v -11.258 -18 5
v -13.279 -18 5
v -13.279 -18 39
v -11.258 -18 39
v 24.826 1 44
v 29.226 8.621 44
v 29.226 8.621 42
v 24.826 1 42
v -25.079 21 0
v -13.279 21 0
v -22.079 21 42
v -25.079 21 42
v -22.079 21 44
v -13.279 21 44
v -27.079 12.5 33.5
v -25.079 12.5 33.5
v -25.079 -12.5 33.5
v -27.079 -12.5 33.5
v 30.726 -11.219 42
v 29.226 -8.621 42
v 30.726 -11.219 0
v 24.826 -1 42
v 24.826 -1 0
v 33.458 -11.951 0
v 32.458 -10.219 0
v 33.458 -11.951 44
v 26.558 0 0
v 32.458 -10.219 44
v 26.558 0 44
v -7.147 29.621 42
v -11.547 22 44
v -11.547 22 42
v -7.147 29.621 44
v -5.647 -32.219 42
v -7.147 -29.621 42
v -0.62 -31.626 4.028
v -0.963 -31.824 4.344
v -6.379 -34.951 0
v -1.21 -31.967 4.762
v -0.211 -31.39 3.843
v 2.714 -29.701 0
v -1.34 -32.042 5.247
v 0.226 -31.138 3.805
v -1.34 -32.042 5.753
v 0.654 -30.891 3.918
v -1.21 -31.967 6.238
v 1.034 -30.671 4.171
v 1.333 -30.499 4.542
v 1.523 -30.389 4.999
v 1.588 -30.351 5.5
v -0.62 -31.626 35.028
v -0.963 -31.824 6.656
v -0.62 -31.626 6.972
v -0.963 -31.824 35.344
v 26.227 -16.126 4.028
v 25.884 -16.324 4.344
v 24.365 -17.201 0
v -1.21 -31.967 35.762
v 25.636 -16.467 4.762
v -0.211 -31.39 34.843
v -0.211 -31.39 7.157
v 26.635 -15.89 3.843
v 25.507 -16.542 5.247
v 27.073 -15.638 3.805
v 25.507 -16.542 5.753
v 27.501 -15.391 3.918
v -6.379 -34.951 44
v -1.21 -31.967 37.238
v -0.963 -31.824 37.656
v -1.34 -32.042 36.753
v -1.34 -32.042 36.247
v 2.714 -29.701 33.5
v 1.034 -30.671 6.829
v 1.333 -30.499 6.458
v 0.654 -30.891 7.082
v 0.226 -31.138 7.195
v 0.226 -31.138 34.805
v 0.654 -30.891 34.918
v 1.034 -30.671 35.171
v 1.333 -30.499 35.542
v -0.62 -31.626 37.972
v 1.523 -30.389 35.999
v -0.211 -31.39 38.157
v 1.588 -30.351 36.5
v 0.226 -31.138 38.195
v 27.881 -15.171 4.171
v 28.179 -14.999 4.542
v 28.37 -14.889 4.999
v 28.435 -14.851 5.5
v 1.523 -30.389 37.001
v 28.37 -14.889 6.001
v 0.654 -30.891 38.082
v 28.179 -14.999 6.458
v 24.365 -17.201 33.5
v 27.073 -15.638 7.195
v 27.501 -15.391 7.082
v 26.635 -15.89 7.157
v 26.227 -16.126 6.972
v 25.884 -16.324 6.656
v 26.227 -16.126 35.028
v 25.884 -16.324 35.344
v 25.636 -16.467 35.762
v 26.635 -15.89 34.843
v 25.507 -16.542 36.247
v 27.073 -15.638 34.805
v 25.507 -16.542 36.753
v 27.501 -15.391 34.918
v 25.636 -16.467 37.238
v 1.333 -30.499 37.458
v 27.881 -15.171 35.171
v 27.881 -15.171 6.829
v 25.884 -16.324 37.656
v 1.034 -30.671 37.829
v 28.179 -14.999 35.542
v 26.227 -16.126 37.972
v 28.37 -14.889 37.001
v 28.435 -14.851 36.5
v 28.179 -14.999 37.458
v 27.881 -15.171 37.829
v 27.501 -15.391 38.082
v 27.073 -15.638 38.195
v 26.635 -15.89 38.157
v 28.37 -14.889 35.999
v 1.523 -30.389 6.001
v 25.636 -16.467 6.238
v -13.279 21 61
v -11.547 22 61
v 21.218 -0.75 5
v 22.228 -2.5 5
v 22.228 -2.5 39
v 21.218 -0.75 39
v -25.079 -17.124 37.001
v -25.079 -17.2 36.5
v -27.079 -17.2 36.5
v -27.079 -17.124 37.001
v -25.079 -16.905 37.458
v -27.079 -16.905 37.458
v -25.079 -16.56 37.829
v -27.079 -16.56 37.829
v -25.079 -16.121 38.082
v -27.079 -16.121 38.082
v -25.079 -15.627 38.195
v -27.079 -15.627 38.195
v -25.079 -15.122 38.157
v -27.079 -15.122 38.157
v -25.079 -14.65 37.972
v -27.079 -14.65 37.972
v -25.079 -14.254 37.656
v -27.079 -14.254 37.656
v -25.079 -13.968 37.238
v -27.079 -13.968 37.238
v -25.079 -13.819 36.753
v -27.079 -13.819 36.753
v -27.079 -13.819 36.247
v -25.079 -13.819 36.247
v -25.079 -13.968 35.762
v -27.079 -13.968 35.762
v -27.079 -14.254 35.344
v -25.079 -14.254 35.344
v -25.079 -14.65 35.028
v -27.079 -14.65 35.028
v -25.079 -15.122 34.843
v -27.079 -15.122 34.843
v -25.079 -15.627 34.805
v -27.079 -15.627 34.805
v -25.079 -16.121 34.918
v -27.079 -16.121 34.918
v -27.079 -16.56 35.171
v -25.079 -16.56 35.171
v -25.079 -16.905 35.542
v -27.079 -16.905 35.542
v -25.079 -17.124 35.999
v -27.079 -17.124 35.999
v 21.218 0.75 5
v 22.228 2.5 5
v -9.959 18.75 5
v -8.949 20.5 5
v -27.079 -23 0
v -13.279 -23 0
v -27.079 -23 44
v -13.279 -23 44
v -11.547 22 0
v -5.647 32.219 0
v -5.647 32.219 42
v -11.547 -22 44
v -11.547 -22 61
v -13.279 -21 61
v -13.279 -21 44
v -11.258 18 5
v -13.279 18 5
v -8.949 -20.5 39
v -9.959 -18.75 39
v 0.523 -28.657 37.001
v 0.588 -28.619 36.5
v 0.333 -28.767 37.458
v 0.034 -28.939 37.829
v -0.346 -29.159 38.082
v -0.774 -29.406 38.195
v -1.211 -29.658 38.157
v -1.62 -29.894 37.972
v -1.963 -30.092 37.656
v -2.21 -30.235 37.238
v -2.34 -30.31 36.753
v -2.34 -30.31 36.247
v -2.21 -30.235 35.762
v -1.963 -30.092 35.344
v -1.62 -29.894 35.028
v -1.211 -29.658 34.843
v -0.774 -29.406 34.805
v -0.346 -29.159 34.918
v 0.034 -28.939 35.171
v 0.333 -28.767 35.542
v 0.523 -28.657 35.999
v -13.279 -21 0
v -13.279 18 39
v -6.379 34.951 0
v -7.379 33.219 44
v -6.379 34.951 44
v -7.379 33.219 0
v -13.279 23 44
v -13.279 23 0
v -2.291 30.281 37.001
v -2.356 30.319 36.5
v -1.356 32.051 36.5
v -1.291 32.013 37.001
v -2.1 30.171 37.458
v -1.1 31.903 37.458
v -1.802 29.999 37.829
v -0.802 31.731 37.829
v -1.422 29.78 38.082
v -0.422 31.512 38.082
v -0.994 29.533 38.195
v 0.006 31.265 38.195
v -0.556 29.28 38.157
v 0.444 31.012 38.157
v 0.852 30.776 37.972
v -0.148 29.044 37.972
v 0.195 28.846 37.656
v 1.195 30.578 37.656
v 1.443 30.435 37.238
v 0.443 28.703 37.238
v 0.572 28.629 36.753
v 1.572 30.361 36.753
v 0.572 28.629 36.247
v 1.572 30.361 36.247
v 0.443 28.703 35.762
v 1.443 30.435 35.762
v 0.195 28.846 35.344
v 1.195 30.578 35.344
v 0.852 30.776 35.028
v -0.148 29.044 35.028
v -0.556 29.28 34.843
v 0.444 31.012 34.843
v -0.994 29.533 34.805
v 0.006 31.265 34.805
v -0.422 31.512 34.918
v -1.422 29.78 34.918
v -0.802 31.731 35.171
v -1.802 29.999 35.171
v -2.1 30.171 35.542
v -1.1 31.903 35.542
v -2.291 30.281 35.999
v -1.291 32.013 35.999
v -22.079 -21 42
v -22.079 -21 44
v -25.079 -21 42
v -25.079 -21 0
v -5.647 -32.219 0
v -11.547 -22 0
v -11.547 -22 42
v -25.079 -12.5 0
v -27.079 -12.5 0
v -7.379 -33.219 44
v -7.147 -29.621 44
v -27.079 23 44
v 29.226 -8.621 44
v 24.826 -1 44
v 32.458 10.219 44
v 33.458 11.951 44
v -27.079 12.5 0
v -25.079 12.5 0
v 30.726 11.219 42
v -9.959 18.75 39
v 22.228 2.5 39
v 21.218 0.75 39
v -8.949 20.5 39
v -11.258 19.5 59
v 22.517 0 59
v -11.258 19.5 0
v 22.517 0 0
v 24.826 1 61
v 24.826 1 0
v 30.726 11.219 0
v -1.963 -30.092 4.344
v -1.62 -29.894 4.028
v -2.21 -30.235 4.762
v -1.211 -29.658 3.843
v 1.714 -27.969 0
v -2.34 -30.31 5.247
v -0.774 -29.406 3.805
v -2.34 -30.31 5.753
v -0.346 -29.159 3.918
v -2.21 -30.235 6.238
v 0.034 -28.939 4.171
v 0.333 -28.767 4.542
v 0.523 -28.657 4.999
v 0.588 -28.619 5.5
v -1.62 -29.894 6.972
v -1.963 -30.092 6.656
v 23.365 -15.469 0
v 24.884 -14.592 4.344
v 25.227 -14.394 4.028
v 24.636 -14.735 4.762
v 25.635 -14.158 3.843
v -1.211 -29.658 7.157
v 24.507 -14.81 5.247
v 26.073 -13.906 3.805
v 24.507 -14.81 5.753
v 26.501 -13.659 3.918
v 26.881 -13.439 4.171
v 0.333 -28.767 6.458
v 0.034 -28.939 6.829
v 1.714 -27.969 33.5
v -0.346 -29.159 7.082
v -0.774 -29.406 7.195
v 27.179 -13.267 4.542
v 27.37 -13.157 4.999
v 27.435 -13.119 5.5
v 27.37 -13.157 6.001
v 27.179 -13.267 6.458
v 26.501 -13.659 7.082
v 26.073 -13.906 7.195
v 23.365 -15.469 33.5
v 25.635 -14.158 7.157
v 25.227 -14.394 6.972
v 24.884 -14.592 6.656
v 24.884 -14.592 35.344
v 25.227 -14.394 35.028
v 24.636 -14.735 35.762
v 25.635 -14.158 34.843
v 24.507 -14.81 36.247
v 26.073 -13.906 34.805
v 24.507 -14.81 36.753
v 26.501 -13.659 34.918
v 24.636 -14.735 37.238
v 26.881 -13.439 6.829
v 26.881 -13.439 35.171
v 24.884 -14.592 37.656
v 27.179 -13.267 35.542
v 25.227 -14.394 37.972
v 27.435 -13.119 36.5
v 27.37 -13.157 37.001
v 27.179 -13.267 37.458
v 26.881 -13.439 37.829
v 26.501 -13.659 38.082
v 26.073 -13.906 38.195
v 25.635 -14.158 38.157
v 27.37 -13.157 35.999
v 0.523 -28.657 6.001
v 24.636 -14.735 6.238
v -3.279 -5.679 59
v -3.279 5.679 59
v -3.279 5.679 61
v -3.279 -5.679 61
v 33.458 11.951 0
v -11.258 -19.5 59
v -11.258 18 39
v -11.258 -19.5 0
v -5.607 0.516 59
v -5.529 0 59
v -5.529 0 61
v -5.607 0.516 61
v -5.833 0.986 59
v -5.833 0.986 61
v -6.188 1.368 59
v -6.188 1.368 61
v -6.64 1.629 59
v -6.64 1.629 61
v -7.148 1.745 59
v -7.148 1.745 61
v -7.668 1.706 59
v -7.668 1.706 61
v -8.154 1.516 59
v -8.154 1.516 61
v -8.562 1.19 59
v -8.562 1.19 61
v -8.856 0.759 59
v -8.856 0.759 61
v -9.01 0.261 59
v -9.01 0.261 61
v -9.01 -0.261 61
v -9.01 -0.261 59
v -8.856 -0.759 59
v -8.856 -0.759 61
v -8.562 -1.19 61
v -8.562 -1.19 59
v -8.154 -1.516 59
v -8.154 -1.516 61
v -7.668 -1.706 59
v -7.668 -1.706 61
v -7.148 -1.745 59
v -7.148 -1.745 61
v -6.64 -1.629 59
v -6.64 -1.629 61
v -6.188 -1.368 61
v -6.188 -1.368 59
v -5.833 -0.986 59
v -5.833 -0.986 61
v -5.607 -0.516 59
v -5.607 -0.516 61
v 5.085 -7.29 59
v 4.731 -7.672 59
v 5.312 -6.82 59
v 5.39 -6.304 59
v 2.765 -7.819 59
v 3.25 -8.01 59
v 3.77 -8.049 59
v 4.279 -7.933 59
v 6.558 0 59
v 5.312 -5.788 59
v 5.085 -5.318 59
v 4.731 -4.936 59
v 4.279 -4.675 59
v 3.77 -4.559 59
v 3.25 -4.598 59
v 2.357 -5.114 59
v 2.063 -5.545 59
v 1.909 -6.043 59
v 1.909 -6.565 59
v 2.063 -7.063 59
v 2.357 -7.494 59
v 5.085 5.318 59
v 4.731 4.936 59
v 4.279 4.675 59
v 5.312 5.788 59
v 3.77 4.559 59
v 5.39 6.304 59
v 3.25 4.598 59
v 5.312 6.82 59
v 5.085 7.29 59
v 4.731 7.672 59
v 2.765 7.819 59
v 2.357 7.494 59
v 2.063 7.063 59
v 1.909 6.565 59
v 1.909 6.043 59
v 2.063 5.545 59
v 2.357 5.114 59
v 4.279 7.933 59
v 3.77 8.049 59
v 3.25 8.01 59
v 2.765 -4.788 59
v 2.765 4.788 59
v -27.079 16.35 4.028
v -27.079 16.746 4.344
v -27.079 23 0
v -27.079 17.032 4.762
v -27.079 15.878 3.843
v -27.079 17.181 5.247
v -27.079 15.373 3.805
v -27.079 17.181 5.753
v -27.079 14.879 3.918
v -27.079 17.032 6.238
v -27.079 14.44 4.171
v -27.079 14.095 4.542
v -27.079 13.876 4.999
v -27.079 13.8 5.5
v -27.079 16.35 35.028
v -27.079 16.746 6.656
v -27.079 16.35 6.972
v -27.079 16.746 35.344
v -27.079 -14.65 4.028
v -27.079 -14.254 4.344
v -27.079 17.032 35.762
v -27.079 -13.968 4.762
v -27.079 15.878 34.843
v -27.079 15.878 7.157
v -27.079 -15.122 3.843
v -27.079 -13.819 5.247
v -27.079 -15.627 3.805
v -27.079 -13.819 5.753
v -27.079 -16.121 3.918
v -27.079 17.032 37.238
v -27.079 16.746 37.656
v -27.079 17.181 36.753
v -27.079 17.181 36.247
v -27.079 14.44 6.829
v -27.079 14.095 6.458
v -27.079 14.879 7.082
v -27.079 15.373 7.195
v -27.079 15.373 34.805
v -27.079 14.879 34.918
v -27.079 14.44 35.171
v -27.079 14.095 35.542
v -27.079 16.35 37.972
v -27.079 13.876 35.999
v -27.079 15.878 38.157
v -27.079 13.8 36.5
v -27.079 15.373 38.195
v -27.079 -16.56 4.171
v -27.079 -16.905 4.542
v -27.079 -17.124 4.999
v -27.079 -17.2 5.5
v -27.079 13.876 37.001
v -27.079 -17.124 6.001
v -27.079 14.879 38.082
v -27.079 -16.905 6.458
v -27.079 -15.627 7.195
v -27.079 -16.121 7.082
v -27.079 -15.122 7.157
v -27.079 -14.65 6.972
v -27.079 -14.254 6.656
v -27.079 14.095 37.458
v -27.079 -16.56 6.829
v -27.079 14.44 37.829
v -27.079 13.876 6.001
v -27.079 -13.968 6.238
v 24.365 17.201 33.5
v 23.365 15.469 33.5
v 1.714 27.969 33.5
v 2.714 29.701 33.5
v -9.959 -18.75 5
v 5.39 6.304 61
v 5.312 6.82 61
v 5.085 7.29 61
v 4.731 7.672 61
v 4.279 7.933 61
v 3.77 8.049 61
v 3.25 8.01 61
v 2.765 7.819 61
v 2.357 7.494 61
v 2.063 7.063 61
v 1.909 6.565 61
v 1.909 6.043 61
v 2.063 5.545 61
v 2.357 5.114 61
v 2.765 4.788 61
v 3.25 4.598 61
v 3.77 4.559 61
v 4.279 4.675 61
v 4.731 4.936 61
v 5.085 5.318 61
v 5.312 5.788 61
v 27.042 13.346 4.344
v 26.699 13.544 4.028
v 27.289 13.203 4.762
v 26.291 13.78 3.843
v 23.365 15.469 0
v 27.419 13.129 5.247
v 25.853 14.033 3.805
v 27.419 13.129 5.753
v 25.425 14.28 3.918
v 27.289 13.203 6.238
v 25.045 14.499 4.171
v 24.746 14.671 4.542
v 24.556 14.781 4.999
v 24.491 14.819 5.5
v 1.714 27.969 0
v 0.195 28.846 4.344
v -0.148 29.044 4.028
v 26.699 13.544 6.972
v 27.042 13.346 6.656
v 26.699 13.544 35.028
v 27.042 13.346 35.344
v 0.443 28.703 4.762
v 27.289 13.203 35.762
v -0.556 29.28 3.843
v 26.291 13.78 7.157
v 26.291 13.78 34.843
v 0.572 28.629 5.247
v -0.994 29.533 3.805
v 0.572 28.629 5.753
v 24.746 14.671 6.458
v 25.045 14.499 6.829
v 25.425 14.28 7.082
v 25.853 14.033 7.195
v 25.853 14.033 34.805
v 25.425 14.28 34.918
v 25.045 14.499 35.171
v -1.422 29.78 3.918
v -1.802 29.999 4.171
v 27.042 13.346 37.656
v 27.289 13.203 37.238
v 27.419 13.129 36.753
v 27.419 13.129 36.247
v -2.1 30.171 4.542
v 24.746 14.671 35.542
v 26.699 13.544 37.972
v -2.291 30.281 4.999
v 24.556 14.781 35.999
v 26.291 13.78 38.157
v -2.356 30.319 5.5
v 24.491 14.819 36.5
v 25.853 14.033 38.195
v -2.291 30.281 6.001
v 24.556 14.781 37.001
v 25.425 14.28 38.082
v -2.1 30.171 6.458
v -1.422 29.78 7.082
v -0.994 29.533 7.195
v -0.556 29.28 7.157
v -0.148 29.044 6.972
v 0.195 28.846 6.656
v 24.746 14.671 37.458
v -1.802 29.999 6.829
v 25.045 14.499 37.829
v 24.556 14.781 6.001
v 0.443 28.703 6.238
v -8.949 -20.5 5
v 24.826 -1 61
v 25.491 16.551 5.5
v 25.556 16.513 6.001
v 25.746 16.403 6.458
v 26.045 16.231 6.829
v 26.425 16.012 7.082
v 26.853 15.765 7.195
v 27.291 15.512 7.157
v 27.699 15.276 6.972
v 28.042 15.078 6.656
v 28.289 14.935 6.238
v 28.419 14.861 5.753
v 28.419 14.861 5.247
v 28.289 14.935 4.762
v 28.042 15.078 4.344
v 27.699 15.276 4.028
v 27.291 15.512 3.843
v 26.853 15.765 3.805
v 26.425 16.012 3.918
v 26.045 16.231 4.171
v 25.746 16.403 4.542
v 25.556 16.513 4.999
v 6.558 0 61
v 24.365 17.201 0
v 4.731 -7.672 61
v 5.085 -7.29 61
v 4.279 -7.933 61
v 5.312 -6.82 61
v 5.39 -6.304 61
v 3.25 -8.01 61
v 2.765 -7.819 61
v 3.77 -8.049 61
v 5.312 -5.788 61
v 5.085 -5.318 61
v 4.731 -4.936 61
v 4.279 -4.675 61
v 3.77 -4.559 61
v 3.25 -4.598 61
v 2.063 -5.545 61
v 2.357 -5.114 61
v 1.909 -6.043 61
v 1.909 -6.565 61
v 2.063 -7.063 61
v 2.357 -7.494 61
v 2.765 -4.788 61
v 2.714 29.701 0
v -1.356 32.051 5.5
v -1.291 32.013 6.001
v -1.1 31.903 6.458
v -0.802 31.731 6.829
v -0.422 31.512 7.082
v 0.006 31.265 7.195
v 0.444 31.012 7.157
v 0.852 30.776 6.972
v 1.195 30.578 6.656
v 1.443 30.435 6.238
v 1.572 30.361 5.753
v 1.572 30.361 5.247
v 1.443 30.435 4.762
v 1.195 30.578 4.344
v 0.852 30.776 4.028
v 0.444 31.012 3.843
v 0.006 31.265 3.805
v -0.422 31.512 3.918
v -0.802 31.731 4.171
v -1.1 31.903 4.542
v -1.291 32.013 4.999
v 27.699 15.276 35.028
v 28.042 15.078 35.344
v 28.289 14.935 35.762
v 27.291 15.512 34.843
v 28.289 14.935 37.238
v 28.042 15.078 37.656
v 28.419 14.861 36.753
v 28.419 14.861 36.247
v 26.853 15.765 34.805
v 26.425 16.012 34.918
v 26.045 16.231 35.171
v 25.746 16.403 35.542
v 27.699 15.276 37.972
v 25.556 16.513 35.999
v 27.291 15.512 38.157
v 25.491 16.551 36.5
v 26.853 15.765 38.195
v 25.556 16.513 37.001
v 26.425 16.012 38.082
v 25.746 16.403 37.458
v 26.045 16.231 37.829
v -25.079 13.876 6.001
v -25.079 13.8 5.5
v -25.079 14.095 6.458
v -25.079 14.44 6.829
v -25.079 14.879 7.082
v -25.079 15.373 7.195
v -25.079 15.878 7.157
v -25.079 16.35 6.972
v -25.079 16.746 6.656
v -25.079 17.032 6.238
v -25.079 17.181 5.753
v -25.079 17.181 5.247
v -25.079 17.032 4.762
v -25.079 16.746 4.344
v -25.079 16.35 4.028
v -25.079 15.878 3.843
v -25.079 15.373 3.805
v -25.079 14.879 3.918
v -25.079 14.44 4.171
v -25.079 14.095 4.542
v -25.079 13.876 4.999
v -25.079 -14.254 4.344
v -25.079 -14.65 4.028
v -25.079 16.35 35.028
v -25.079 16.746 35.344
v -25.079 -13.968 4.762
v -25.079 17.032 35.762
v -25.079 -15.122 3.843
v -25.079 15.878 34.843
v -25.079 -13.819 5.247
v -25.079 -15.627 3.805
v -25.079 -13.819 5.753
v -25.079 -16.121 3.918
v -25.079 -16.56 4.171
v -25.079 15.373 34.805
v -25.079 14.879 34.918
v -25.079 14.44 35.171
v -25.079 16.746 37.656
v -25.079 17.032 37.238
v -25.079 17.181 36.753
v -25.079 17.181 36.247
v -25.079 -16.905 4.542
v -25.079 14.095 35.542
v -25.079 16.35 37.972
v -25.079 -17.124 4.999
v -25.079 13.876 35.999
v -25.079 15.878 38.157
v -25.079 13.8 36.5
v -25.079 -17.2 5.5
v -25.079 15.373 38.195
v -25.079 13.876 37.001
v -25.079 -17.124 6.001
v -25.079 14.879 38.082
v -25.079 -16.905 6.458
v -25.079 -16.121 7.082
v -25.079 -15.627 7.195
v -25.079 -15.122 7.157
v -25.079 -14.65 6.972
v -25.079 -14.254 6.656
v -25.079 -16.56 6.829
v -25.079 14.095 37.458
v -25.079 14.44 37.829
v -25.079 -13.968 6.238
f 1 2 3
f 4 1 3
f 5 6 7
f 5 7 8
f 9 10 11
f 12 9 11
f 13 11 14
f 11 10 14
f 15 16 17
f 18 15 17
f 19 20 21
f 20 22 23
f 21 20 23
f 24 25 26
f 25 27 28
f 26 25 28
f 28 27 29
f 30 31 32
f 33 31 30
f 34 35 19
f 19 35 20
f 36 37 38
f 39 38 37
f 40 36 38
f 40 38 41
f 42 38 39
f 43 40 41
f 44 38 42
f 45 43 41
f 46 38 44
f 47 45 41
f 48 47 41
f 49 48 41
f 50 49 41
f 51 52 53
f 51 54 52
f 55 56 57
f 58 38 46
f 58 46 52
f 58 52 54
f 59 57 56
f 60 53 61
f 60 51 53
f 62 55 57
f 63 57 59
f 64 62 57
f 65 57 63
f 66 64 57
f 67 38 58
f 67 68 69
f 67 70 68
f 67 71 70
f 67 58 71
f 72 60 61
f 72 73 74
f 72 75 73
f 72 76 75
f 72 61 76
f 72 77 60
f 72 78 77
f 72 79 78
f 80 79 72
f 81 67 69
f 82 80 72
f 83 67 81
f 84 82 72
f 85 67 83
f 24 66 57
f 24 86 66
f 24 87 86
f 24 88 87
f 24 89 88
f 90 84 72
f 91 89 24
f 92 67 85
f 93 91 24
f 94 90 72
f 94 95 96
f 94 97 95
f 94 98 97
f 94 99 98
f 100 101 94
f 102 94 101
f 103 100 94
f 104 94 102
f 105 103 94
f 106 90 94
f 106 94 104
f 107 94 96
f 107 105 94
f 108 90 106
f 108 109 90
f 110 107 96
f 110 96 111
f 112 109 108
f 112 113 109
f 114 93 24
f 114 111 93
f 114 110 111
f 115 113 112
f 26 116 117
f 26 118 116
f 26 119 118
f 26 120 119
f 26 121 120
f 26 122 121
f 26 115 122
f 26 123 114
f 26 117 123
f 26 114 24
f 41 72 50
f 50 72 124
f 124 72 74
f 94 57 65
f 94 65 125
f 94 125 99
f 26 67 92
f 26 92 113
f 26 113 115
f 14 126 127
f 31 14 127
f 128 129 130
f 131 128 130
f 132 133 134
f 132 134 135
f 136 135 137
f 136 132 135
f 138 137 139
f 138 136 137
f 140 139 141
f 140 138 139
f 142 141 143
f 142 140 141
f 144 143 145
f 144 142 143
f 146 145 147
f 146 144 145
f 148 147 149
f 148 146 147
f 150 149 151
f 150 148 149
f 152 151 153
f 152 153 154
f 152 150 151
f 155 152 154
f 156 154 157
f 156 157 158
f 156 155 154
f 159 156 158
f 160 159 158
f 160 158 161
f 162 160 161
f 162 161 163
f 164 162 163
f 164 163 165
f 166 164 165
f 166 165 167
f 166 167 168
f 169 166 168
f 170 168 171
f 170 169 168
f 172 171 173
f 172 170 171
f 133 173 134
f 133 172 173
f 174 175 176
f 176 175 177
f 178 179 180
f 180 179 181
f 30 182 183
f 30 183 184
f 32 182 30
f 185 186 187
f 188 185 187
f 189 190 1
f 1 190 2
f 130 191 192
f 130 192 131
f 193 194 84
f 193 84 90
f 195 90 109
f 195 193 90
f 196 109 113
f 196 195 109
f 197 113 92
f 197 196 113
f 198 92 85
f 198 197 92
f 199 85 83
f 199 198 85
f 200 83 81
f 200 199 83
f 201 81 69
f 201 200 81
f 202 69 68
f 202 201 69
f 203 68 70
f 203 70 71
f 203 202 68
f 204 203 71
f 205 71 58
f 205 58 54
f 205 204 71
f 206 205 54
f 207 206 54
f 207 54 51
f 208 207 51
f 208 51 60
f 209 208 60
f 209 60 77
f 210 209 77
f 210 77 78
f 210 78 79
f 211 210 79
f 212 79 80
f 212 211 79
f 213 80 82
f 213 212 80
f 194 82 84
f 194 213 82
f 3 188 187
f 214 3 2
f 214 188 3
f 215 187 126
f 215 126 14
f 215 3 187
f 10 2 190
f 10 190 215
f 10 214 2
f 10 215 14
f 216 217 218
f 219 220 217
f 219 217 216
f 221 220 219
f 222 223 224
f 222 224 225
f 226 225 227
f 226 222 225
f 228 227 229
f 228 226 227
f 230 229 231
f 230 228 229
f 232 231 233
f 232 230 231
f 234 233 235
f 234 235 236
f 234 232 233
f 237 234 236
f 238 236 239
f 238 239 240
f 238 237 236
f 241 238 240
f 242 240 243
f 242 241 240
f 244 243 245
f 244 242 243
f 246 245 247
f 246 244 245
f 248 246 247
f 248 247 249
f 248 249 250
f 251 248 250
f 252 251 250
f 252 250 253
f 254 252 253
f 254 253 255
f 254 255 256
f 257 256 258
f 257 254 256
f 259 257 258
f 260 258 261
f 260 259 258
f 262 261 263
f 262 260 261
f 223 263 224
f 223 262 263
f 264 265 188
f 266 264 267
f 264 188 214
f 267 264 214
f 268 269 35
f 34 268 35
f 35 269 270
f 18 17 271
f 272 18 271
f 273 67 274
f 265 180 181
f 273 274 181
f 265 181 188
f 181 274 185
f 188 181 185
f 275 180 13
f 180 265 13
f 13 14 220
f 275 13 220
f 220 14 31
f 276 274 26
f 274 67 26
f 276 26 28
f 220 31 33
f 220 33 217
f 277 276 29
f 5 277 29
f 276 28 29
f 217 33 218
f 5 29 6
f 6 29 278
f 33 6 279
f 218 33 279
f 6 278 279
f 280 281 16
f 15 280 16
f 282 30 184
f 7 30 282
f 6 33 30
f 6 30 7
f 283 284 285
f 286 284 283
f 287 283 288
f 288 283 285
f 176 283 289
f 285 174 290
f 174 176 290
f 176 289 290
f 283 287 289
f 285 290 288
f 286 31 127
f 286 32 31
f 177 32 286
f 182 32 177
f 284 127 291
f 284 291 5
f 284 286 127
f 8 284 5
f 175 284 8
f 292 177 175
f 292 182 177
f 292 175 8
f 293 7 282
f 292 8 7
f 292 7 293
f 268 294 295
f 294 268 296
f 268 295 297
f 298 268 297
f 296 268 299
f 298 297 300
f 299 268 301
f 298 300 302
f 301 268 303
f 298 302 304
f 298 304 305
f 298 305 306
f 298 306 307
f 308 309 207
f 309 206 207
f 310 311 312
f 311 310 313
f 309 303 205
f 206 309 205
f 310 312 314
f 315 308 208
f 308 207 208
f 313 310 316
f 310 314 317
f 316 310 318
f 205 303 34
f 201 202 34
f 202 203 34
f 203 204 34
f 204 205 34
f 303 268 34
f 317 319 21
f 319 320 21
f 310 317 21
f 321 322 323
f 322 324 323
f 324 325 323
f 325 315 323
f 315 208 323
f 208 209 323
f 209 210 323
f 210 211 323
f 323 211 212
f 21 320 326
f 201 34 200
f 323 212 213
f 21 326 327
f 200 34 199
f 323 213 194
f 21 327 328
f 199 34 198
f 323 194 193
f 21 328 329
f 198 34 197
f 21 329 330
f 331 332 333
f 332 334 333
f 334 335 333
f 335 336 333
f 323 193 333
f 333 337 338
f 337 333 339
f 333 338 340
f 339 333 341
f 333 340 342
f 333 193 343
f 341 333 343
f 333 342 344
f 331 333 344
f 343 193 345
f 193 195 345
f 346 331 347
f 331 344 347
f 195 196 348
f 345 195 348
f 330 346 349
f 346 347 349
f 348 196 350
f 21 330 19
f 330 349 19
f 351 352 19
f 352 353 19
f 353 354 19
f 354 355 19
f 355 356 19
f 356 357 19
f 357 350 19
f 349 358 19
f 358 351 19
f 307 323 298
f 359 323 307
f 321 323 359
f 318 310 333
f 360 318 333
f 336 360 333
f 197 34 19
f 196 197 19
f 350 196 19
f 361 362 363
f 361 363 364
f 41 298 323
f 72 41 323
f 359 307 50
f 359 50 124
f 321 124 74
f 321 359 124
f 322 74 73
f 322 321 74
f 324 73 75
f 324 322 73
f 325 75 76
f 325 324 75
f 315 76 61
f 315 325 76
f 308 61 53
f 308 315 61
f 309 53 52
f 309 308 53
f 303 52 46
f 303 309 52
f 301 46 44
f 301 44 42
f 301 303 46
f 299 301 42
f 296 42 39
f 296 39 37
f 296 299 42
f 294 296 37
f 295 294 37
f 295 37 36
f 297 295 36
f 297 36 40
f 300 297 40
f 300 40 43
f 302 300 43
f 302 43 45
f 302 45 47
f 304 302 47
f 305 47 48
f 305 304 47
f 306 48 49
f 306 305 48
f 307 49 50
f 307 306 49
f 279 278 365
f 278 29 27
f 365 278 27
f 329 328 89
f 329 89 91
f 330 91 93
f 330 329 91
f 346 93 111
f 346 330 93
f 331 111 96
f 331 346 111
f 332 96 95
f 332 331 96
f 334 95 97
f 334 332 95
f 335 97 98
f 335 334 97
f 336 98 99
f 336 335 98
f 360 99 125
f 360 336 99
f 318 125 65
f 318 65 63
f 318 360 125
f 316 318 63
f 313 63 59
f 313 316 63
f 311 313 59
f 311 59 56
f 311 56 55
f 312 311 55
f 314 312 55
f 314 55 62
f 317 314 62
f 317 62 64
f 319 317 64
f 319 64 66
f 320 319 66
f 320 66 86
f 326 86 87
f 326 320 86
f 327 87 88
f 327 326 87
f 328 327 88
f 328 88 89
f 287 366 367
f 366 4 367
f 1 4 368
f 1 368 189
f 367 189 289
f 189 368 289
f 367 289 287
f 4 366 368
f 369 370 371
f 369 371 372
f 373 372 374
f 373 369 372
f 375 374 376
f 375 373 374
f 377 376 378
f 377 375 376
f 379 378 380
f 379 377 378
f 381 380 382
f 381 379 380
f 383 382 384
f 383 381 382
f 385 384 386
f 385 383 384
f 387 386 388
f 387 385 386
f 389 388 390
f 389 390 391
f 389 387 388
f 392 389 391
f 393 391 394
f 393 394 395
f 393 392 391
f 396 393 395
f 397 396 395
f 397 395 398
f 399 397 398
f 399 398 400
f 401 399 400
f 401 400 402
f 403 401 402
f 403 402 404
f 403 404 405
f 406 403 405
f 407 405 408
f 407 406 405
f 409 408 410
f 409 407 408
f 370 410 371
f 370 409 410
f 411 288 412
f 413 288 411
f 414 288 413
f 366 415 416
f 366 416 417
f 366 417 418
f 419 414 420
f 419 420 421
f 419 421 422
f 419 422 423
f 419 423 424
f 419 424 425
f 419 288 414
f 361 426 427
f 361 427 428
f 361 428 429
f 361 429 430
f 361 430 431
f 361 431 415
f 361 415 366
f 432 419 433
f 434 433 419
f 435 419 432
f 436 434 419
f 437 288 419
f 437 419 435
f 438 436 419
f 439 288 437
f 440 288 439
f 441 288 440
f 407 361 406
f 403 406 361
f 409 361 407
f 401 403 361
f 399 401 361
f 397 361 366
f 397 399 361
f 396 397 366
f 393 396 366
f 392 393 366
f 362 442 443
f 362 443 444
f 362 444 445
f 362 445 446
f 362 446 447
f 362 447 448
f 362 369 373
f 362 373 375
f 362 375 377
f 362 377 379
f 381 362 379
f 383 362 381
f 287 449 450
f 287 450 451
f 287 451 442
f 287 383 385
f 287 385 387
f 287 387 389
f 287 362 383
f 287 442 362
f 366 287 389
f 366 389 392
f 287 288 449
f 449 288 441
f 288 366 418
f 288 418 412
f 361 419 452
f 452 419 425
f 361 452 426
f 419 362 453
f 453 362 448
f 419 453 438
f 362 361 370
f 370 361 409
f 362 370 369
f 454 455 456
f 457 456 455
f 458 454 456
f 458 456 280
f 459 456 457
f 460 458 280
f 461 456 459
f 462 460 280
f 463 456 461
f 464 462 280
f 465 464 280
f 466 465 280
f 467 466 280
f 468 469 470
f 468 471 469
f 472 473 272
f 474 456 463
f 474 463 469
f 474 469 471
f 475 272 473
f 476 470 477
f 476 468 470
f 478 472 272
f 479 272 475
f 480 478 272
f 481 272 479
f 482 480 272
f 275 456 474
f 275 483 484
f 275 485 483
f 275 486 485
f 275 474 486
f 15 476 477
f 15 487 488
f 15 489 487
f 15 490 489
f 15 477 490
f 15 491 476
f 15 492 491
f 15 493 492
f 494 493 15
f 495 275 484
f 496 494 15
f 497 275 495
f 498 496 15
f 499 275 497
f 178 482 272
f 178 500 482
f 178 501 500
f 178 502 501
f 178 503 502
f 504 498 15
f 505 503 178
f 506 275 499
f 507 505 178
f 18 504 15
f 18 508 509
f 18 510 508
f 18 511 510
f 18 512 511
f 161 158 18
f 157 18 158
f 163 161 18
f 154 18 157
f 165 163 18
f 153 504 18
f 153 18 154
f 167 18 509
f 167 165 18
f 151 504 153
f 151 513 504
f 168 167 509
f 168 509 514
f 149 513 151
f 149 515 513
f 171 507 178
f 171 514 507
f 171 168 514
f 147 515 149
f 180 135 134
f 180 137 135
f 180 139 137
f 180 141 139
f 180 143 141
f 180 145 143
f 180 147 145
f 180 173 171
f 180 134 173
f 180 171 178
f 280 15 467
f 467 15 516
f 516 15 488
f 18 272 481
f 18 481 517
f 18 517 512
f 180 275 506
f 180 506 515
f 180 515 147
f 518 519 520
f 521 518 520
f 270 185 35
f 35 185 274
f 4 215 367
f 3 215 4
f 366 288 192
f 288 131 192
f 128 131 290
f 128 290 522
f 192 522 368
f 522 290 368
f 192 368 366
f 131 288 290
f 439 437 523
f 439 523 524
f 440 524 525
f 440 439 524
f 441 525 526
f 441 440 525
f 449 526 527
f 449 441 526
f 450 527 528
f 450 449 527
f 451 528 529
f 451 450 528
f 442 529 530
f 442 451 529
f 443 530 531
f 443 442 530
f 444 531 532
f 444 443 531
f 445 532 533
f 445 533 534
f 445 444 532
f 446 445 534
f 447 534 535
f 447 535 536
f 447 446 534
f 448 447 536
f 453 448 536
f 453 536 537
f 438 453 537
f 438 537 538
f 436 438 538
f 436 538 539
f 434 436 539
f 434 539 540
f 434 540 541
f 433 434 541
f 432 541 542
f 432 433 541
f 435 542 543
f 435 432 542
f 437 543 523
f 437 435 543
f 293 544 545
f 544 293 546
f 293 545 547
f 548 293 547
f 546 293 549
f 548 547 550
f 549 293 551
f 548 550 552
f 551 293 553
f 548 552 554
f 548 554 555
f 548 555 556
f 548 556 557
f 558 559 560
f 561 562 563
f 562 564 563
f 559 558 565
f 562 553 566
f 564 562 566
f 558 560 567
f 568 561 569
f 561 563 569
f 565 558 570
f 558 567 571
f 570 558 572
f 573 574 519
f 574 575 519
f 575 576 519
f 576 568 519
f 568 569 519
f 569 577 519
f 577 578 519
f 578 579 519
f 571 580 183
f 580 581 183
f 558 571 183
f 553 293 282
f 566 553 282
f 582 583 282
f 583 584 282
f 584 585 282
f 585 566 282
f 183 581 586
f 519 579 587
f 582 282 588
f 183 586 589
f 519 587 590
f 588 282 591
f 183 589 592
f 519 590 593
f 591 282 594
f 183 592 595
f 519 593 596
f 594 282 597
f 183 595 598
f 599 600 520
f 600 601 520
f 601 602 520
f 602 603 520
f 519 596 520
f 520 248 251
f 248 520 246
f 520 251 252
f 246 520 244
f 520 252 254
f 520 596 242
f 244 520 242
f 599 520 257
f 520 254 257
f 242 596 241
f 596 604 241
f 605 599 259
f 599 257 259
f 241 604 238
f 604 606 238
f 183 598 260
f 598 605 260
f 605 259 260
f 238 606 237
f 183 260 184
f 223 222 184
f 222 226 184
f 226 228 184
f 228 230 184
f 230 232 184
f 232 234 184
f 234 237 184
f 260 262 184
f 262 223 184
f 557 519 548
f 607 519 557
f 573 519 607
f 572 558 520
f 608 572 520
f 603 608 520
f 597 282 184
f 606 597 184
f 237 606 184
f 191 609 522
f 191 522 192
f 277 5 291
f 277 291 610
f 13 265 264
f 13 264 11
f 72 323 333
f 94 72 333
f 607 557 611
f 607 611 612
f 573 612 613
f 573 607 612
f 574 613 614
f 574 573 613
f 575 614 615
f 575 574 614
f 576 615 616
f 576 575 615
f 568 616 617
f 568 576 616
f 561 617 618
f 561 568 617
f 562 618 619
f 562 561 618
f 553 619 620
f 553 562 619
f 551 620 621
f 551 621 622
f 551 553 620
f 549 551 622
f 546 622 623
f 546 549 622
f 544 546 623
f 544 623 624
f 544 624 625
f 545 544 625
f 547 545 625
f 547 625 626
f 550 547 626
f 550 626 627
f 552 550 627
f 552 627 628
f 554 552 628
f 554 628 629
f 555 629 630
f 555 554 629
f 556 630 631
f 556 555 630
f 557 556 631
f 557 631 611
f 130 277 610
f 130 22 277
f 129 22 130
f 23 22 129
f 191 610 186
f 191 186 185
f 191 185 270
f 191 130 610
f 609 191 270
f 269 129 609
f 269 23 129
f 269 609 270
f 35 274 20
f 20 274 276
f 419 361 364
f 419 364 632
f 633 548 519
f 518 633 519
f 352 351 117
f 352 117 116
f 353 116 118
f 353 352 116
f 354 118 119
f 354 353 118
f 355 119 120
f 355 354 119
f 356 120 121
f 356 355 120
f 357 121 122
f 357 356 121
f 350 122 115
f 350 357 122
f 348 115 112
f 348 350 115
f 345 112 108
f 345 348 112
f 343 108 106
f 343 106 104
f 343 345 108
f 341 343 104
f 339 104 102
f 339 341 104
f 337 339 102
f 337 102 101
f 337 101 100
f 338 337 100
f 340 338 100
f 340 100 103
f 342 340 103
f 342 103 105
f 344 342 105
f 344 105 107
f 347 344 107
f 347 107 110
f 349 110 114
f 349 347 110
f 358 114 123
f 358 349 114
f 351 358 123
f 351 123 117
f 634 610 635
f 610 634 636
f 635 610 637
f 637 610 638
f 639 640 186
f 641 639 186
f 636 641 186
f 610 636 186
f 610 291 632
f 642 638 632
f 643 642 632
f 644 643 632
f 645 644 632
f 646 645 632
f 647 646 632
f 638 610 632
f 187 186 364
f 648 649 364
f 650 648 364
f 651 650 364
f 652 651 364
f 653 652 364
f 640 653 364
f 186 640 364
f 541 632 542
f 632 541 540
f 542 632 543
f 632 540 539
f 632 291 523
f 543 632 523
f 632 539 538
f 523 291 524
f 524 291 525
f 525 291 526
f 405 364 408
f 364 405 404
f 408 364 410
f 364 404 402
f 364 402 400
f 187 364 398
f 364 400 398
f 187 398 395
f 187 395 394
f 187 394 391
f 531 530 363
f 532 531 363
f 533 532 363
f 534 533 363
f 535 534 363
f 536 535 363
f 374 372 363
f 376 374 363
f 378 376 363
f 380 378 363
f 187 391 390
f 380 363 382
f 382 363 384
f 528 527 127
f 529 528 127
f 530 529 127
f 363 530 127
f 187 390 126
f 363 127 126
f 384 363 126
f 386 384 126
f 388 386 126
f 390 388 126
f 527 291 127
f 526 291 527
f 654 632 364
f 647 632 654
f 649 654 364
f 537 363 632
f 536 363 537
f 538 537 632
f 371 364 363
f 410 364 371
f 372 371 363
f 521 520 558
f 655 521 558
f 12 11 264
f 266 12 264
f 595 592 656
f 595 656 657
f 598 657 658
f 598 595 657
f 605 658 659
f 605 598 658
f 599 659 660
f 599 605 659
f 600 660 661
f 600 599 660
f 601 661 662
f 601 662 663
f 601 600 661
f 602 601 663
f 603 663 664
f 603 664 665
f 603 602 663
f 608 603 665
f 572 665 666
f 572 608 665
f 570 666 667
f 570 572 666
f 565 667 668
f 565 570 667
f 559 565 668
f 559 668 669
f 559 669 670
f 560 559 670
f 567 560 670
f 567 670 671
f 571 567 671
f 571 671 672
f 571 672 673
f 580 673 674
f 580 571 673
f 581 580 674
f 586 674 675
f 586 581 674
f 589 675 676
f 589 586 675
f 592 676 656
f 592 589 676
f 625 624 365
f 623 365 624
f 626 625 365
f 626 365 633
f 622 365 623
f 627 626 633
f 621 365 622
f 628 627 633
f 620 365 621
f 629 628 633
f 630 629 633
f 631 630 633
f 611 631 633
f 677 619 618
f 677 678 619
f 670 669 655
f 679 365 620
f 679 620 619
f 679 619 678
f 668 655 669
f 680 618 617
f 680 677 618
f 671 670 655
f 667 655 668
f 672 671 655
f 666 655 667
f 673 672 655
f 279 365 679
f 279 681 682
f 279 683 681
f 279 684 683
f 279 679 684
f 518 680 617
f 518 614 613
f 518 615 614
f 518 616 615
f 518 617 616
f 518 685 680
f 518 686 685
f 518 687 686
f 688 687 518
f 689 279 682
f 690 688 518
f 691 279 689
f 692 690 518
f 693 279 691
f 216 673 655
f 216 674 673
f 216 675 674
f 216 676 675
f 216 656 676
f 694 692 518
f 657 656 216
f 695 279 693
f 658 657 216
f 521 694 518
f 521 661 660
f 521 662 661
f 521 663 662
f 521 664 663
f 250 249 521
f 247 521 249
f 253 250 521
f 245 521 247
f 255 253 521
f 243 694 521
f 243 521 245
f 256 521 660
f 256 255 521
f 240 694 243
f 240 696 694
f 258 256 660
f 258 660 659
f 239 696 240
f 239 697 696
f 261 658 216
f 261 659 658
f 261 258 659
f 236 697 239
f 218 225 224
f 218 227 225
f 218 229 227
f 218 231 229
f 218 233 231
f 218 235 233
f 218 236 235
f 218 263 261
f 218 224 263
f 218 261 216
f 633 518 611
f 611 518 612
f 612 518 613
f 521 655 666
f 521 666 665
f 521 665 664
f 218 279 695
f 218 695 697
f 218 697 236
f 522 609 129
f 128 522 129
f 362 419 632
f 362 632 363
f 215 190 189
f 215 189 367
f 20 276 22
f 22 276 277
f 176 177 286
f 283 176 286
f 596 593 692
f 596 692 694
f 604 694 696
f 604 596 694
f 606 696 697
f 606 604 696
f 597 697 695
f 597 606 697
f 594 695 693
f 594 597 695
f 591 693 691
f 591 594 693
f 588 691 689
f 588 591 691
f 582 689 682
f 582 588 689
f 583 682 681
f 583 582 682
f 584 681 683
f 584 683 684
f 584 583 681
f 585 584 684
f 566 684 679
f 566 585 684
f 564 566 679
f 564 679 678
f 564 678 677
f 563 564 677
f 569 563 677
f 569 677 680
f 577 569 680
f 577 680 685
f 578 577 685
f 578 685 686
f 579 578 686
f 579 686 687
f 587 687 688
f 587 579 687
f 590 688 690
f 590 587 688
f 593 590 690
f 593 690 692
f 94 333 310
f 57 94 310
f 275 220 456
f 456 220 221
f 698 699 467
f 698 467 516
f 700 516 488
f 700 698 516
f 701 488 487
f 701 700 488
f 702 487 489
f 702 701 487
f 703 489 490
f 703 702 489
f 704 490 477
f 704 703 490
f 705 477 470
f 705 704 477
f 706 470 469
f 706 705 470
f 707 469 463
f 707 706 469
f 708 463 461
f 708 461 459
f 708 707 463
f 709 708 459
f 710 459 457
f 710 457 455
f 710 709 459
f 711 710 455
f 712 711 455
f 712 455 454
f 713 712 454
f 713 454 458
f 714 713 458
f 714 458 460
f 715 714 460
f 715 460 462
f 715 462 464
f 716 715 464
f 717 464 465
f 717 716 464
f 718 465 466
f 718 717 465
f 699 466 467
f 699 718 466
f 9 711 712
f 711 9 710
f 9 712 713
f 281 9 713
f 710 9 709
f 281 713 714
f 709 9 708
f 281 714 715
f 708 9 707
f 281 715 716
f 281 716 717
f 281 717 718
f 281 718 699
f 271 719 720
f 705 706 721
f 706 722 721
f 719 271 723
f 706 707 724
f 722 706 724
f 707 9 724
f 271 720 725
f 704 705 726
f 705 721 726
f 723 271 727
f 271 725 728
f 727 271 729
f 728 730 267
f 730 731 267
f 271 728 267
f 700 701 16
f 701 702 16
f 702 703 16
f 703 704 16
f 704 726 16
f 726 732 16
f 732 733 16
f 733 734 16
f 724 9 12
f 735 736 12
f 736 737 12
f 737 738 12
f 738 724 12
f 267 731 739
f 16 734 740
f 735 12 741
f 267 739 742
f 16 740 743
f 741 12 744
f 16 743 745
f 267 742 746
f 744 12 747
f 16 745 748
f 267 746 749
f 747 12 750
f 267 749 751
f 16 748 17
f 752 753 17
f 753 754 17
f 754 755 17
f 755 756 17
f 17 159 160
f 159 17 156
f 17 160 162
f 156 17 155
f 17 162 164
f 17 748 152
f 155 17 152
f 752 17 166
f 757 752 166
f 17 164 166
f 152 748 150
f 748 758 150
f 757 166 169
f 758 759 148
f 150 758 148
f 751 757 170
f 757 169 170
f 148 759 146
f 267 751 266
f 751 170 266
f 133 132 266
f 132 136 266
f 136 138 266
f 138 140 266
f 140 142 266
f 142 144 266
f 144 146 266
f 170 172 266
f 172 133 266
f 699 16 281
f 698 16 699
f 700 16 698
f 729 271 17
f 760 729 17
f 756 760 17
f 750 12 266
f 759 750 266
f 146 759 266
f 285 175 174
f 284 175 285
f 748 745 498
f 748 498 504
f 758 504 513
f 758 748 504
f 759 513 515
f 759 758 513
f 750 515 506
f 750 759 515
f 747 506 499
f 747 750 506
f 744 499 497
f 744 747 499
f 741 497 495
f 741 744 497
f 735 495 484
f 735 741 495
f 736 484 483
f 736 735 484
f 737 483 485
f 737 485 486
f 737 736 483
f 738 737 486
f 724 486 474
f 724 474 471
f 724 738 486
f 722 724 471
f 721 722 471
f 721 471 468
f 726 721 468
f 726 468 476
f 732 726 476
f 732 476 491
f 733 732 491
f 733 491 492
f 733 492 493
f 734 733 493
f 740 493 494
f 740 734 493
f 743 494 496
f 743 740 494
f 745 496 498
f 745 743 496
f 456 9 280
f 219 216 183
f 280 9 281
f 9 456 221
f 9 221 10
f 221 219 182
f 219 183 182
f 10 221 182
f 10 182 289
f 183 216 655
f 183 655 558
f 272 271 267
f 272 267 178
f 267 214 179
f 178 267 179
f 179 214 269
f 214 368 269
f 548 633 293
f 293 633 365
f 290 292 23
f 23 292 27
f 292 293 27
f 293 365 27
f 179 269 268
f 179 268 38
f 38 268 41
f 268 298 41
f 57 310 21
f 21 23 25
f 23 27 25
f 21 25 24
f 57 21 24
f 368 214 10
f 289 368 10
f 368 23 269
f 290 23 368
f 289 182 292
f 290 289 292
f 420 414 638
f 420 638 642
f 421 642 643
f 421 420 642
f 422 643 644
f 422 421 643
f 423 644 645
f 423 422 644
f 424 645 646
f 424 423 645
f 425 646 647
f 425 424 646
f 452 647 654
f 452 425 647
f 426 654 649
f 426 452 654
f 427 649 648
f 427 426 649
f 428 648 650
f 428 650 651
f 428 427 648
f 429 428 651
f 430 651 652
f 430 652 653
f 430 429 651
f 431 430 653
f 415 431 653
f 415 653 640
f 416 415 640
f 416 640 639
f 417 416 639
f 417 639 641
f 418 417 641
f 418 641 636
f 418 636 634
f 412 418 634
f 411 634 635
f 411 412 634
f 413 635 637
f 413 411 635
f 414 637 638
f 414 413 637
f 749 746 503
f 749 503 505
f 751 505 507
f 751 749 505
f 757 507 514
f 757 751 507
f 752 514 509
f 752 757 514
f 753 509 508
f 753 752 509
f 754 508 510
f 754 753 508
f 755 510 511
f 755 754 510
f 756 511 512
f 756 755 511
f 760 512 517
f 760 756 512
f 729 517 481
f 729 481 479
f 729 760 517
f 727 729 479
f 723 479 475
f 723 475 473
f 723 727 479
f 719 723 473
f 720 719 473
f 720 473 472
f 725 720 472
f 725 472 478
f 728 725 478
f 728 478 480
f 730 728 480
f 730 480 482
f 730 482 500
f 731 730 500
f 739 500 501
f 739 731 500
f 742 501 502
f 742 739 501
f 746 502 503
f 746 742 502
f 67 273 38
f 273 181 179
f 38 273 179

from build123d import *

# Parameters (mm, degrees)
PAD_DEPTH       = 44
PAD001_DEPTH    = 11.8
SKETCH002_R     = 1.7
PAD002_DEPTH    = 2
POCKET_DEPTH    = 5
SKETCH004_W     = 36
SKETCH004_H     = 34
POCKET001_DEPTH = 3
SKETCH005_W     = 36
SKETCH005_H     = 34
POCKET002_DEPTH = 4
PAD003_DEPTH    = 11.8
SKETCH007_R     = 1.7
PAD004_DEPTH    = 2
POCKET003_DEPTH = 2
PAD005_DEPTH    = 11.8
SKETCH010_R     = 1.7
PAD006_DEPTH    = 2
SKETCH011_W     = 8.8
SKETCH011_H     = 42
POCKET004_DEPTH = 2
SKETCH012_W     = 36
SKETCH012_H     = 34
POCKET005_DEPTH = 3
PAD007_DEPTH    = 15
SKETCH014_R     = 1.75
PAD008_DEPTH    = 2


with BuildPart() as part:
    # Sketch → Pad (new body)
    with BuildSketch(Plane.XY):
        Polygon((26.5581123827, 0), (-13.2790561914, 23), (-13.2790561914, -23), align=None)
        Polygon((22.5166604984, 0), (-11.2583302492, 19.5), (-11.2583302492, -19.5), align=None, mode=Mode.SUBTRACT)
    extrude(amount=PAD_DEPTH)

    # Sketch001 (on Face3 of Pad) → Pad001 (join)
    with BuildSketch(Plane(origin=(6.6395280957, -11.5, 0), x_dir=(0.8660254038, 0.5, 0), z_dir=(0.5, -0.8660254038, 0))):
        Polygon((-23, 0), (-21, 0), (-21, 42), (21, 42), (21, 0), (23, 0), (23, 44), (-23, 44), align=None)
    extrude(amount=PAD001_DEPTH)

    # Sketch002 (on Face8 of Pad001) → Pad002 (join)
    with BuildSketch(Plane(origin=(12.5395280957, -21.7190997647, 0), x_dir=(0.8660254038, 0.5, 0), z_dir=(0.5, -0.8660254038, 0))):
        Polygon((-23, 0), (-12.5, 0), (-12.5, 33.5), (12.5, 33.5), (12.5, 0), (23, 0), (23, 44), (-23, 44), align=None)
        with Locations((-15.5, 36.5)):
            Circle(SKETCH002_R, mode=Mode.SUBTRACT)
        with Locations((-15.5, 5.5)):
            Circle(SKETCH002_R, mode=Mode.SUBTRACT)
        with Locations((15.5, 5.5)):
            Circle(SKETCH002_R, mode=Mode.SUBTRACT)
        with Locations((15.5, 36.5)):
            Circle(SKETCH002_R, mode=Mode.SUBTRACT)
    extrude(amount=PAD002_DEPTH)

    # Sketch003 (on Face7 of Pad002) → Pocket (cut)
    with BuildSketch(Plane.XY.offset(44)):
        Polygon((-11.5470053838, -22), (-7.1470053838, -29.6210235533), (29.2260615752, -8.6210235533), (24.8260615752, -1), align=None)
    extrude(amount=-POCKET_DEPTH, mode=Mode.SUBTRACT)

    # Sketch004 (on Face11 of Pocket) → Pocket001 (cut)
    with BuildSketch(Plane(origin=(6.6395280957, -11.5, 0), x_dir=(0.8660254038, 0.5, 0), z_dir=(0.5, -0.8660254038, 0))):
        with Locations((0, 22)):
            Rectangle(SKETCH004_W, SKETCH004_H)
    extrude(amount=-POCKET001_DEPTH, mode=Mode.SUBTRACT)

    # Sketch005 (on Face1 of Pocket001) → Pocket002 (cut)
    with BuildSketch(Plane(origin=(6.6395280957, 11.5, 0), x_dir=(-0.8660254038, 0.5, 0), z_dir=(0.5, 0.8660254038, 0))):
        with Locations((0, 22)):
            Rectangle(SKETCH005_W, SKETCH005_H)
    extrude(amount=-POCKET002_DEPTH, mode=Mode.SUBTRACT)

    # Sketch006 (on Face1 of Pocket002) → Pad003 (join)
    with BuildSketch(Plane(origin=(6.6395280957, 11.5, 0), x_dir=(-0.8660254038, 0.5, 0), z_dir=(0.5, 0.8660254038, 0))):
        Polygon((-23, 44), (23, 44), (23, 0), (21, 0), (21, 42), (-21, 42), (-21, 0), (-23, 0), align=None)
    extrude(amount=PAD003_DEPTH)

    # Sketch007 (on Face19 of Pad003) → Pad004 (join)
    with BuildSketch(Plane(origin=(12.5395280957, 21.7190997647, 0), x_dir=(-0.8660254038, 0.5, 0), z_dir=(0.5, 0.8660254038, 0))):
        Polygon((-23, 0), (-12.5, 0), (-12.5, 33.5), (12.5, 33.5), (12.5, 0), (23, 0), (23, 44), (-23, 44), align=None)
        with Locations((-15.5, 36.5)):
            Circle(SKETCH007_R, mode=Mode.SUBTRACT)
        with Locations((15.5, 36.5)):
            Circle(SKETCH007_R, mode=Mode.SUBTRACT)
        with Locations((15.5, 5.5)):
            Circle(SKETCH007_R, mode=Mode.SUBTRACT)
        with Locations((-15.5, 5.5)):
            Circle(SKETCH007_R, mode=Mode.SUBTRACT)
    extrude(amount=PAD004_DEPTH)

    # Sketch008 (on Face43 of Pad004) → Pocket003 (cut)
    with BuildSketch(Plane.XY.offset(44)):
        Polygon((-11.5470053838, 22), (-7.1470053838, 29.6210235533), (29.2260615751, 8.6210235533), (24.8260615752, 1), align=None)
    extrude(amount=-POCKET003_DEPTH, mode=Mode.SUBTRACT)

    # Sketch009 (on Face12 of Pocket003) → Pad005 (join)
    with BuildSketch(Plane(origin=(-13.2790561914, 0, 0), x_dir=(0, -1, 0), z_dir=(-1, 0, 0))):
        Polygon((-23, 0), (-21, 0), (-21, 42), (21, 42), (21, 0), (23, 0), (23, 44), (-23, 44), align=None)
    extrude(amount=PAD005_DEPTH)

    # Sketch010 (on Face32 of Pad005) → Pad006 (join)
    with BuildSketch(Plane(origin=(-25.0790561914, 0, 0), x_dir=(0, -1, 0), z_dir=(-1, 0, 0))):
        Polygon((-23, 0), (-12.5, 0), (-12.5, 33.5), (12.5, 33.5), (12.5, 0), (23, 0), (23, 44), (-23, 44), align=None)
        with Locations((-15.5, 5.5)):
            Circle(SKETCH010_R, mode=Mode.SUBTRACT)
        with Locations((-15.5, 36.5)):
            Circle(SKETCH010_R, mode=Mode.SUBTRACT)
        with Locations((15.5, 36.5)):
            Circle(SKETCH010_R, mode=Mode.SUBTRACT)
        with Locations((15.5, 5.5)):
            Circle(SKETCH010_R, mode=Mode.SUBTRACT)
    extrude(amount=PAD006_DEPTH)

    # Sketch011 (on Face57 of Pad006) → Pocket004 (cut)
    with BuildSketch(Plane.XY.offset(44)):
        with Locations((-17.6790561914, 0)):
            Rectangle(SKETCH011_W, SKETCH011_H)
    extrude(amount=-POCKET004_DEPTH, mode=Mode.SUBTRACT)

    # Sketch012 (on Face13 of Pocket004) → Pocket005 (cut)
    with BuildSketch(Plane(origin=(-13.2790561914, 0, 0), x_dir=(0, -1, 0), z_dir=(-1, 0, 0))):
        with Locations((0, 22)):
            Rectangle(SKETCH012_W, SKETCH012_H)
    extrude(amount=-POCKET005_DEPTH, mode=Mode.SUBTRACT)

    # Sketch013 (on Face25 of Pocket005) → Pad007 (join)
    with BuildSketch(Plane.XY.offset(44)):
        Polygon((-13.2790561914, 21), (-11.5470053838, 22), (24.8260615752, 1), (24.8260615752, -1), (-11.5470053838, -22), (-13.2790561914, -21), align=None)
        Polygon((-11.2583302492, 19.5), (22.5166604984, 0), (-11.2583302492, -19.5), align=None, mode=Mode.SUBTRACT)
    extrude(amount=PAD007_DEPTH)

    # Sketch014 (on Face66 of Pad007) → Pad008 (join)
    with BuildSketch(Plane.XY.offset(59)):
        Polygon((-13.2790561914, 21), (-11.5470053838, 22), (24.8260615752, 1), (24.8260615752, -1), (-11.5470053838, -22), (-13.2790561914, -21), align=None)
        with Locations((-7.2790561914, 0)):
            Circle(SKETCH014_R, mode=Mode.SUBTRACT)
        with Locations((3.6395280957, 6.3038475773)):
            Circle(SKETCH014_R, mode=Mode.SUBTRACT)
        with Locations((3.6395280957, -6.3038475773)):
            Circle(SKETCH014_R, mode=Mode.SUBTRACT)
        Polygon((6.5581123827, 0), (-3.2790561914, 5.6794919243), (-3.2790561914, -5.6794919243), align=None, mode=Mode.SUBTRACT)
    extrude(amount=PAD008_DEPTH)


solid = part.part
